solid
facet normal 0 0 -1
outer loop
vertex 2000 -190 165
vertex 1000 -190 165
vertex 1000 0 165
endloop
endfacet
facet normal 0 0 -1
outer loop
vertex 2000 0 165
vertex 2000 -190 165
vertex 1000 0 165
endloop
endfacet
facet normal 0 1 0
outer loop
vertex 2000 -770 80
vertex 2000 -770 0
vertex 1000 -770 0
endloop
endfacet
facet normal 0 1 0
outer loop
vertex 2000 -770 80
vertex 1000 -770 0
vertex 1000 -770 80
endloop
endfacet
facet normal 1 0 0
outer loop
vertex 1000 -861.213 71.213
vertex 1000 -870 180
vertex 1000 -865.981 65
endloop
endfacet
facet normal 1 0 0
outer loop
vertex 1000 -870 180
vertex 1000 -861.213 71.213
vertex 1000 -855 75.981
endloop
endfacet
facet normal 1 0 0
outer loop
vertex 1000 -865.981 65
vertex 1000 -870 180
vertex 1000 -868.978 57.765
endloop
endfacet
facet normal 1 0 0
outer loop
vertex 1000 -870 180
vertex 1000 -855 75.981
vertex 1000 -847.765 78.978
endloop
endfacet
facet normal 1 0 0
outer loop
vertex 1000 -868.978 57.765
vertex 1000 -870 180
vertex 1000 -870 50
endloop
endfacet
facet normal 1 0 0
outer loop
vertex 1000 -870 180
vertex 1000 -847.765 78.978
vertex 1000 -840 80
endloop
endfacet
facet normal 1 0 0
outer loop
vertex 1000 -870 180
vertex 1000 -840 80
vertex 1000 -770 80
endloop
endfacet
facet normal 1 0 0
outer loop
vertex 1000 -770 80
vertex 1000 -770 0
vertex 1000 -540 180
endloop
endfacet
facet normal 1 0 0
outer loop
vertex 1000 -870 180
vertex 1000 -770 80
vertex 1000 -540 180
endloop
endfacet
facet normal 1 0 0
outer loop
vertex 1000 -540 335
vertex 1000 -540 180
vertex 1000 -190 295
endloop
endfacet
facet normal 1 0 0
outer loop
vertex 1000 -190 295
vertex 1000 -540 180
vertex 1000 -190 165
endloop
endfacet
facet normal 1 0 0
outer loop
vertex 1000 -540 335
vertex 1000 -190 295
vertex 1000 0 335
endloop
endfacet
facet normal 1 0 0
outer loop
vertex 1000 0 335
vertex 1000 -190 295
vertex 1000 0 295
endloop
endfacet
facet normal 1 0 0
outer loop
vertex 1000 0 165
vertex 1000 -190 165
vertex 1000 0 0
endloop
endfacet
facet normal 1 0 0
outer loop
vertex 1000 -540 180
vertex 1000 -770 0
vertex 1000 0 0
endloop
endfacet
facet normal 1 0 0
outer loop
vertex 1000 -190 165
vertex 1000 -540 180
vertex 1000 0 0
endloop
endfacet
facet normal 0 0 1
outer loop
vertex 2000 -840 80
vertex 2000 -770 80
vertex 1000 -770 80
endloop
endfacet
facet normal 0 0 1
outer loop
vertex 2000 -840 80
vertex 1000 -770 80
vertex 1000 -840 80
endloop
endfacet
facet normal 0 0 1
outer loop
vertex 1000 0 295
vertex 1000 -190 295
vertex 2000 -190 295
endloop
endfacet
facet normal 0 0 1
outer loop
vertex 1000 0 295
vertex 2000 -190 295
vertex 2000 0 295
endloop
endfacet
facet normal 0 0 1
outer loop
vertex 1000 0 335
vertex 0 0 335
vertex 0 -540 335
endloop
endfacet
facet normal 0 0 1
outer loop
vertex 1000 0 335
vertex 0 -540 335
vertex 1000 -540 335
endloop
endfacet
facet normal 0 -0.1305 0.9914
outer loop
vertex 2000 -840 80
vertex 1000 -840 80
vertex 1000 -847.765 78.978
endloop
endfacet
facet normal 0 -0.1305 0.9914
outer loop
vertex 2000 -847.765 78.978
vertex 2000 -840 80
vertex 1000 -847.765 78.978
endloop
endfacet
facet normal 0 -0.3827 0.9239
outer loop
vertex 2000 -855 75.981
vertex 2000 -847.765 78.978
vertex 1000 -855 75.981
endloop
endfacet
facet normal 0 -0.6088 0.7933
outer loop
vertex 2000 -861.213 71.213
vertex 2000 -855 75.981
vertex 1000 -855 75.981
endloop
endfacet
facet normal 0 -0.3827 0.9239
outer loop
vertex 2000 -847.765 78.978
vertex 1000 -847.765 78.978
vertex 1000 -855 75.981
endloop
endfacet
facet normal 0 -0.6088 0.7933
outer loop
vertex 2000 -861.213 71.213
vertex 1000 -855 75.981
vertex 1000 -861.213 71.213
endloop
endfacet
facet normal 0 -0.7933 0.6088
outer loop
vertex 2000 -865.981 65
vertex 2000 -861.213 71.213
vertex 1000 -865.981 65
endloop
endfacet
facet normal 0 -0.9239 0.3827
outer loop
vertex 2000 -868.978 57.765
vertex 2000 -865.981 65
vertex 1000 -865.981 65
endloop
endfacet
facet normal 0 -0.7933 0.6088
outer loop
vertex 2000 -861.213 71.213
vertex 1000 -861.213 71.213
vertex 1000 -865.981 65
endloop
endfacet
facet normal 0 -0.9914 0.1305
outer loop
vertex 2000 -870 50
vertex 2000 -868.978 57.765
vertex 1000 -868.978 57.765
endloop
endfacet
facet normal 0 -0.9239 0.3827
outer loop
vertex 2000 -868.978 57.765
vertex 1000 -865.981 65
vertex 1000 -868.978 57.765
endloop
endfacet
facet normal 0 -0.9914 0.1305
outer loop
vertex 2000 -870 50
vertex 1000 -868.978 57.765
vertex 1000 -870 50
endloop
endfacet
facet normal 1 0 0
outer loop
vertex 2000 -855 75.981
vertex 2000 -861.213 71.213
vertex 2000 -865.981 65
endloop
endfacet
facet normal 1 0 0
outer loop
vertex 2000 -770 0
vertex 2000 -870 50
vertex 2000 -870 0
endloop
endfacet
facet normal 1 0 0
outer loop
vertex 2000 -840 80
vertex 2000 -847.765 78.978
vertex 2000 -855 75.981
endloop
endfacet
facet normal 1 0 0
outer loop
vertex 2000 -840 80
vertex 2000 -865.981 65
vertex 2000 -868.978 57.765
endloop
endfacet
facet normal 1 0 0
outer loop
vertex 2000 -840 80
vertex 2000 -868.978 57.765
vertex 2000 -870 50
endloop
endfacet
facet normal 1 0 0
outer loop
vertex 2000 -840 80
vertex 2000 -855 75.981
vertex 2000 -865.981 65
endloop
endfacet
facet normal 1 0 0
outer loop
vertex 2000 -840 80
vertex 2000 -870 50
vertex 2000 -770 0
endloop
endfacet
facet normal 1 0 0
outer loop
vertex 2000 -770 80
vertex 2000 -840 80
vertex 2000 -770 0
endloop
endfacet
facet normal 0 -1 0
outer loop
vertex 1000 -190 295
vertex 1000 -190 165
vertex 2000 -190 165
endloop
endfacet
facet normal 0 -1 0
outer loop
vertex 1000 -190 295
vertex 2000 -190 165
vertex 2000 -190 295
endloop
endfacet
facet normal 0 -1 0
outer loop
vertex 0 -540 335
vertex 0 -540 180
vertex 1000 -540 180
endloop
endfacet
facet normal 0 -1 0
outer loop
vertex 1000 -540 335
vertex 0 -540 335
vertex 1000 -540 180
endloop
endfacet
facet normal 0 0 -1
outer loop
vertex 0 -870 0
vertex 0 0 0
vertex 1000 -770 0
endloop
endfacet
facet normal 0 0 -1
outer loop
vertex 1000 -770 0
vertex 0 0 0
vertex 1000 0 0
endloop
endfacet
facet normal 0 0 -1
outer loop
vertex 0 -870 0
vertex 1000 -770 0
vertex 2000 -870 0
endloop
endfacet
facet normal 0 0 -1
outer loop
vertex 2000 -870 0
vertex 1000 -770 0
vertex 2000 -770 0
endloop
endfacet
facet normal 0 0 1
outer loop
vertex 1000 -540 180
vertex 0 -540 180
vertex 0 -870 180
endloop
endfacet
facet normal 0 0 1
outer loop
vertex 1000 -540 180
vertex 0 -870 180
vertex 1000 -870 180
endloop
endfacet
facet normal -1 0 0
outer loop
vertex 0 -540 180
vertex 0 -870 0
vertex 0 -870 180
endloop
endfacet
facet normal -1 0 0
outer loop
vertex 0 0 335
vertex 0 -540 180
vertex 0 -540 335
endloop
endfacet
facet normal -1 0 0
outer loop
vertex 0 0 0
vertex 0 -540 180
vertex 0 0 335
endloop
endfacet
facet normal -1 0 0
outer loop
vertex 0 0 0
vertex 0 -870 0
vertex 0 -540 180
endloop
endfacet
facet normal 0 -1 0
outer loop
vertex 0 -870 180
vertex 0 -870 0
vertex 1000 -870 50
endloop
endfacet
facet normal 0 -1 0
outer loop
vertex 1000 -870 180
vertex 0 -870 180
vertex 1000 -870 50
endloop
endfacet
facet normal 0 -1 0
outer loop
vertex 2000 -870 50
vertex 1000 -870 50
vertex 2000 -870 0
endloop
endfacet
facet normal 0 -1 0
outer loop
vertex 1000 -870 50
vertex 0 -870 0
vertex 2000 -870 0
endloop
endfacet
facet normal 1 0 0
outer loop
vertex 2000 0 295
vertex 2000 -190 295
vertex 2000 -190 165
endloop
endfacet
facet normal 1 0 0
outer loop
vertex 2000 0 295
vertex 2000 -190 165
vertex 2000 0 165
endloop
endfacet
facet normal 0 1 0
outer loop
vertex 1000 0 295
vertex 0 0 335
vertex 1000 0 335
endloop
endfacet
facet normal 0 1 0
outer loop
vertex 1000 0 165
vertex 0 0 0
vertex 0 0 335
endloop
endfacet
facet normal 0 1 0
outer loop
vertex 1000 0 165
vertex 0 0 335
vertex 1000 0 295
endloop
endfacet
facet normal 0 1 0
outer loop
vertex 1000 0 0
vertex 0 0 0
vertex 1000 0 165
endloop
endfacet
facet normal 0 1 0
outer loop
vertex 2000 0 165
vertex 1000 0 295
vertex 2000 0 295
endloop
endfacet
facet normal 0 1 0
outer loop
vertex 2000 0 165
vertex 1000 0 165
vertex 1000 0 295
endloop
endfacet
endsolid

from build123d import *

# Parameters (mm, degrees)
F0_W     = 1000
F0_H     = 330
F1_DEPTH = 180
F0_H_2   = 540
F2_DEPTH = 335
F3_W     = 190
F3_H     = 130
F4_DEPTH = 1000
F6_DEPTH = 1000


with BuildPart() as f1:
    # F0 (on Top) → F1 (new body)
    with BuildSketch(Plane.XY):
        with Locations((500, -705)):
            Rectangle(F0_W, F0_H)
    extrude(amount=F1_DEPTH)

    # F0 (on Top) → F2 (join)
    with BuildSketch(Plane.XY):
        with Locations((500, -270)):
            Rectangle(F0_W, F0_H_2)
    extrude(amount=F2_DEPTH)

    # F3 (on face) → F4 (join)
    with BuildSketch(Plane.YZ.offset(1000)):
        with Locations((-95, 230)):
            Rectangle(F3_W, F3_H)
    extrude(amount=F4_DEPTH)

    # F3 (on face) → F6 (join)
    with BuildSketch(Plane.YZ.offset(1000)):
        with Locations((-95, 230)):
            Rectangle(F3_W, F3_H)
        with BuildLine():
            Line((-870, 50), (-870, 0))
            Line((-870, 0), (-770, 0))
            Line((-770, 0), (-770, 80))
            Line((-770, 80), (-840, 80))
            ThreePointArc((-840, 80), (-861.213203, 71.213203), (-870, 50))
        make_face()
    extrude(amount=F6_DEPTH)


solid = f1.part
